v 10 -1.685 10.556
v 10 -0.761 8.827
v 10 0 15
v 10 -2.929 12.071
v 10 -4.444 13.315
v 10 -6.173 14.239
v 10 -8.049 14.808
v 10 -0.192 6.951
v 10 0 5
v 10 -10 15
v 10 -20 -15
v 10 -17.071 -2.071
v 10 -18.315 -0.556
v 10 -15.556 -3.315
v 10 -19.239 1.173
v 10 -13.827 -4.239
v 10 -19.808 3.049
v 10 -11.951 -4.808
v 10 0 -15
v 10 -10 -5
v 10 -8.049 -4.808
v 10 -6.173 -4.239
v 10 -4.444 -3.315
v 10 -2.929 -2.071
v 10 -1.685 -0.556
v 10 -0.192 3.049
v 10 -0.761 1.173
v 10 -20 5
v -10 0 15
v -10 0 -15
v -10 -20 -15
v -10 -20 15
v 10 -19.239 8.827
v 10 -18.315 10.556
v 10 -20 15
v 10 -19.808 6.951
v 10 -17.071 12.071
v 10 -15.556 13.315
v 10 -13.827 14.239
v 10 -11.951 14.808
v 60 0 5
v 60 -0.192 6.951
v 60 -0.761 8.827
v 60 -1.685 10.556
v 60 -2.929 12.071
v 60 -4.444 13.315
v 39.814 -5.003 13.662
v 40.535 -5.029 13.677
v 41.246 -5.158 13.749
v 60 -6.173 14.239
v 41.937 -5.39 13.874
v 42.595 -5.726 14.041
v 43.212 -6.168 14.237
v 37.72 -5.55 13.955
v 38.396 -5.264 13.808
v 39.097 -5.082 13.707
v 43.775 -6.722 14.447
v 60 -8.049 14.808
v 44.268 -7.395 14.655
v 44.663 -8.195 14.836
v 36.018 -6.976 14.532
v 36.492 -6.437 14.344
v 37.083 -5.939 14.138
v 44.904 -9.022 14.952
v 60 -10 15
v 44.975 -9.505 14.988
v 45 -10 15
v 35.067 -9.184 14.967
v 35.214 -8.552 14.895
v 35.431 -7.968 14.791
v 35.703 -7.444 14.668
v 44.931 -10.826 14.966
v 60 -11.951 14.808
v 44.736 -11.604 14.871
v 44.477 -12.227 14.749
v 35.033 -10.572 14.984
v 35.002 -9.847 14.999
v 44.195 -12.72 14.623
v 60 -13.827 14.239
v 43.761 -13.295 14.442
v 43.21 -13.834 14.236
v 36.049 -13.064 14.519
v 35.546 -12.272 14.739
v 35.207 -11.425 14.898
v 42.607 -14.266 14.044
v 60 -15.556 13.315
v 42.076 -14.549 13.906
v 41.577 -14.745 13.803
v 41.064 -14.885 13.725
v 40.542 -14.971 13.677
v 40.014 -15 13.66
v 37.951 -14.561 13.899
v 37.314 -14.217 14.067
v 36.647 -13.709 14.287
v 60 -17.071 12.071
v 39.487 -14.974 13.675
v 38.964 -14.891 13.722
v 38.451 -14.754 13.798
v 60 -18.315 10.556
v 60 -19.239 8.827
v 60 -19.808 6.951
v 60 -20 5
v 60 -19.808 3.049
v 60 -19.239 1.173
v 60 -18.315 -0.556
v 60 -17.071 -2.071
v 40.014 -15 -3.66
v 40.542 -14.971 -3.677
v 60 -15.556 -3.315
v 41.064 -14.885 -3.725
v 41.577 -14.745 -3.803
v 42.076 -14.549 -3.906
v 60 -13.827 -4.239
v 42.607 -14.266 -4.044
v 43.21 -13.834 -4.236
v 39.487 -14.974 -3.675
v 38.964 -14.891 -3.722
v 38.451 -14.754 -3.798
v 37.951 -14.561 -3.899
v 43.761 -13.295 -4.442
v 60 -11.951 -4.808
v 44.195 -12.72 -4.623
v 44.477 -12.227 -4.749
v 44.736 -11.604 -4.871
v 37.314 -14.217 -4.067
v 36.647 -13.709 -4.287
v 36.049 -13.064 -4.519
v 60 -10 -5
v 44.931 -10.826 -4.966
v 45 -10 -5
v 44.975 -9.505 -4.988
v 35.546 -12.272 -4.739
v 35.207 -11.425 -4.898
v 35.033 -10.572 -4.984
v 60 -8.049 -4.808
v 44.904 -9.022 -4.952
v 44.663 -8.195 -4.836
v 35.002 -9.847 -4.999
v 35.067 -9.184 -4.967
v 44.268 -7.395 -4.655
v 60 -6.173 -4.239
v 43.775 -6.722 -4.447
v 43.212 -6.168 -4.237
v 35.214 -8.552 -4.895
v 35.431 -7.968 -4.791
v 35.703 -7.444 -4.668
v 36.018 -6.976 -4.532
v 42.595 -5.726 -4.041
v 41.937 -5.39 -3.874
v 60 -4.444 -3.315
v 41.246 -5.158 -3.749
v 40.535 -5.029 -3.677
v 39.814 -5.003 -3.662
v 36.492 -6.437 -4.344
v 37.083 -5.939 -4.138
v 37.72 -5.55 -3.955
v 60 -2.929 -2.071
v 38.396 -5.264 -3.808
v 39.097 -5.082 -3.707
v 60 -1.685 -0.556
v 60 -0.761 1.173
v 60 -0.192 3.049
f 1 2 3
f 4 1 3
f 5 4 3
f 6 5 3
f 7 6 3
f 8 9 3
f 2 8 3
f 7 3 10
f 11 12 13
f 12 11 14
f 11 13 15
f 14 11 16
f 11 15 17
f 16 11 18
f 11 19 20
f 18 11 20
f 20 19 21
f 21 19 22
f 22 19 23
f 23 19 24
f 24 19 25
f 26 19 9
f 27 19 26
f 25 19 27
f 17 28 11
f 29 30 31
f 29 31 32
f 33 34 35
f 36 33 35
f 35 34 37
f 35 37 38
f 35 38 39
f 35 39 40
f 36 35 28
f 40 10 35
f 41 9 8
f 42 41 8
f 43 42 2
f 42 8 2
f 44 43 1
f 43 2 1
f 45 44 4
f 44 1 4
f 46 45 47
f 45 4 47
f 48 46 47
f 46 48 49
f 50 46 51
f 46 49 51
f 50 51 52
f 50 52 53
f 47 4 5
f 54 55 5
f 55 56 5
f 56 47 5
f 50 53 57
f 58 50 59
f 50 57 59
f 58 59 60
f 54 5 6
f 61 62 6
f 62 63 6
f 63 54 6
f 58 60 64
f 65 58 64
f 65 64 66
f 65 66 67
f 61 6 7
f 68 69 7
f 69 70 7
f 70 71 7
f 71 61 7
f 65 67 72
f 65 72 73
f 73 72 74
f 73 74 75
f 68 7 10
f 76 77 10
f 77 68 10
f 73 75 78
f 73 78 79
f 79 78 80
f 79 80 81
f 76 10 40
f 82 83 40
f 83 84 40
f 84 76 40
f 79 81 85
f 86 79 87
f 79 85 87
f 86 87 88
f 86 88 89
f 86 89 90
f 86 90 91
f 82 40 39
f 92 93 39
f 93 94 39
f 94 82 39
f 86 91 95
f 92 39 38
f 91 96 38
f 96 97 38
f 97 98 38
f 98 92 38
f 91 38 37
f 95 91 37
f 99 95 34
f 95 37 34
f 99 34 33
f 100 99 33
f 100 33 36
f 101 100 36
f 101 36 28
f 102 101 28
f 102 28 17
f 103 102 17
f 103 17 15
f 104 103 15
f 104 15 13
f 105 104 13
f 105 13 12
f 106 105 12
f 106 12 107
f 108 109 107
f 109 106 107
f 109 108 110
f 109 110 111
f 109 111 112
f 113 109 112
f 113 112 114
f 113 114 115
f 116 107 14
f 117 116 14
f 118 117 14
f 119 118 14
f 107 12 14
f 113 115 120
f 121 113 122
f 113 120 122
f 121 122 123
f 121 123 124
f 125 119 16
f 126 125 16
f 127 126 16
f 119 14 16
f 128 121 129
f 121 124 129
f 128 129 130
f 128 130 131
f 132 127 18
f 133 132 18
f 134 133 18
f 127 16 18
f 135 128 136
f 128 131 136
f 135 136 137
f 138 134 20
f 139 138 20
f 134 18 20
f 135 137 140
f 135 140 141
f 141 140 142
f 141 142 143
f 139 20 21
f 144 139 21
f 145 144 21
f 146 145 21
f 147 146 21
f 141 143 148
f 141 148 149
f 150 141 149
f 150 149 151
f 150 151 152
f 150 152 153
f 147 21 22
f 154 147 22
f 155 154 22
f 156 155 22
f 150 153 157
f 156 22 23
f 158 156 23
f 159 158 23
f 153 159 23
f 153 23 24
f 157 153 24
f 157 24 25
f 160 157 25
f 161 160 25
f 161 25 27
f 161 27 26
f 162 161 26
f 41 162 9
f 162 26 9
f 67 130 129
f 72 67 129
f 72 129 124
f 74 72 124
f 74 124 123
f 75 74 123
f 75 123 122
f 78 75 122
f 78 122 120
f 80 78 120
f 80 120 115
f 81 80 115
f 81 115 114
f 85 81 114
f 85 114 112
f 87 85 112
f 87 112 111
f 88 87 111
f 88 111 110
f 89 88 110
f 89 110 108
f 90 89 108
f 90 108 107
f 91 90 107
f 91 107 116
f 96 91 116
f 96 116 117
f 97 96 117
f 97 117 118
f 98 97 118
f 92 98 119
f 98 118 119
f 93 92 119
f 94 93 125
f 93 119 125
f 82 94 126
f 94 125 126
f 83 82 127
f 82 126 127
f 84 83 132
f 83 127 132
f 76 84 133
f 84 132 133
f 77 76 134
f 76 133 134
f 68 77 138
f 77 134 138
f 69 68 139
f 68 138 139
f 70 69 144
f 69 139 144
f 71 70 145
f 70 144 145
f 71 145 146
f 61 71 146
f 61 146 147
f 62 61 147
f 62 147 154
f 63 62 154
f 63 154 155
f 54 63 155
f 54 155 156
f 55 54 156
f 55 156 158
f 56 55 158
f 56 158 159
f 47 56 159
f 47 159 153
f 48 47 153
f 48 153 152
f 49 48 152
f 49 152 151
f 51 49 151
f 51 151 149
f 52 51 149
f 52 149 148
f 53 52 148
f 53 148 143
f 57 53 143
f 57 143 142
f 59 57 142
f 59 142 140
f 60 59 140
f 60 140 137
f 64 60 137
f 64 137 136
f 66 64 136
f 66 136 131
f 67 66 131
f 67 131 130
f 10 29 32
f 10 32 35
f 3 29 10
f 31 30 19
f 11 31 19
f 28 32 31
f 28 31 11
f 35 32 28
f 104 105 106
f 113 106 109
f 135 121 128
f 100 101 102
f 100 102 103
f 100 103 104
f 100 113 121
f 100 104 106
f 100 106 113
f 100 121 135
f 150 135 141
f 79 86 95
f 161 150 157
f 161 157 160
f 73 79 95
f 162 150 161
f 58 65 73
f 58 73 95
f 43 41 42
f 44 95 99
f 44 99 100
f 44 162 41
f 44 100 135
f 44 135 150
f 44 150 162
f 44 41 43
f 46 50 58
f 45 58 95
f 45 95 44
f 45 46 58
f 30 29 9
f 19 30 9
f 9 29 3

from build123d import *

# Parameters (mm, degrees)
F0_W     = 20
F0_H     = 30
F1_DEPTH = 20
F2_R     = 10
F3_DEPTH = 50
F4_R     = 5
F5_DEPTH = 30.001


with BuildPart() as f1:
    # F0 (on Front) → F1 (new body)
    with BuildSketch(Plane.XZ):
        Rectangle(F0_W, F0_H)
    extrude(amount=F1_DEPTH)

    # F2 (on face) → F3 (join)
    with BuildSketch(Plane.YZ.offset(10)):
        with Locations((-10, 5)):
            Circle(F2_R)
    extrude(amount=F3_DEPTH)

    # F4 (on face) → F5 (cut, through all)
    with BuildSketch(Plane(origin=(0, 0, -15), x_dir=(1, 0, 0), z_dir=(0, 0, -1))):
        with Locations((40, 10)):
            Circle(F4_R)
    extrude(amount=-F5_DEPTH, mode=Mode.SUBTRACT)


solid = f1.part
